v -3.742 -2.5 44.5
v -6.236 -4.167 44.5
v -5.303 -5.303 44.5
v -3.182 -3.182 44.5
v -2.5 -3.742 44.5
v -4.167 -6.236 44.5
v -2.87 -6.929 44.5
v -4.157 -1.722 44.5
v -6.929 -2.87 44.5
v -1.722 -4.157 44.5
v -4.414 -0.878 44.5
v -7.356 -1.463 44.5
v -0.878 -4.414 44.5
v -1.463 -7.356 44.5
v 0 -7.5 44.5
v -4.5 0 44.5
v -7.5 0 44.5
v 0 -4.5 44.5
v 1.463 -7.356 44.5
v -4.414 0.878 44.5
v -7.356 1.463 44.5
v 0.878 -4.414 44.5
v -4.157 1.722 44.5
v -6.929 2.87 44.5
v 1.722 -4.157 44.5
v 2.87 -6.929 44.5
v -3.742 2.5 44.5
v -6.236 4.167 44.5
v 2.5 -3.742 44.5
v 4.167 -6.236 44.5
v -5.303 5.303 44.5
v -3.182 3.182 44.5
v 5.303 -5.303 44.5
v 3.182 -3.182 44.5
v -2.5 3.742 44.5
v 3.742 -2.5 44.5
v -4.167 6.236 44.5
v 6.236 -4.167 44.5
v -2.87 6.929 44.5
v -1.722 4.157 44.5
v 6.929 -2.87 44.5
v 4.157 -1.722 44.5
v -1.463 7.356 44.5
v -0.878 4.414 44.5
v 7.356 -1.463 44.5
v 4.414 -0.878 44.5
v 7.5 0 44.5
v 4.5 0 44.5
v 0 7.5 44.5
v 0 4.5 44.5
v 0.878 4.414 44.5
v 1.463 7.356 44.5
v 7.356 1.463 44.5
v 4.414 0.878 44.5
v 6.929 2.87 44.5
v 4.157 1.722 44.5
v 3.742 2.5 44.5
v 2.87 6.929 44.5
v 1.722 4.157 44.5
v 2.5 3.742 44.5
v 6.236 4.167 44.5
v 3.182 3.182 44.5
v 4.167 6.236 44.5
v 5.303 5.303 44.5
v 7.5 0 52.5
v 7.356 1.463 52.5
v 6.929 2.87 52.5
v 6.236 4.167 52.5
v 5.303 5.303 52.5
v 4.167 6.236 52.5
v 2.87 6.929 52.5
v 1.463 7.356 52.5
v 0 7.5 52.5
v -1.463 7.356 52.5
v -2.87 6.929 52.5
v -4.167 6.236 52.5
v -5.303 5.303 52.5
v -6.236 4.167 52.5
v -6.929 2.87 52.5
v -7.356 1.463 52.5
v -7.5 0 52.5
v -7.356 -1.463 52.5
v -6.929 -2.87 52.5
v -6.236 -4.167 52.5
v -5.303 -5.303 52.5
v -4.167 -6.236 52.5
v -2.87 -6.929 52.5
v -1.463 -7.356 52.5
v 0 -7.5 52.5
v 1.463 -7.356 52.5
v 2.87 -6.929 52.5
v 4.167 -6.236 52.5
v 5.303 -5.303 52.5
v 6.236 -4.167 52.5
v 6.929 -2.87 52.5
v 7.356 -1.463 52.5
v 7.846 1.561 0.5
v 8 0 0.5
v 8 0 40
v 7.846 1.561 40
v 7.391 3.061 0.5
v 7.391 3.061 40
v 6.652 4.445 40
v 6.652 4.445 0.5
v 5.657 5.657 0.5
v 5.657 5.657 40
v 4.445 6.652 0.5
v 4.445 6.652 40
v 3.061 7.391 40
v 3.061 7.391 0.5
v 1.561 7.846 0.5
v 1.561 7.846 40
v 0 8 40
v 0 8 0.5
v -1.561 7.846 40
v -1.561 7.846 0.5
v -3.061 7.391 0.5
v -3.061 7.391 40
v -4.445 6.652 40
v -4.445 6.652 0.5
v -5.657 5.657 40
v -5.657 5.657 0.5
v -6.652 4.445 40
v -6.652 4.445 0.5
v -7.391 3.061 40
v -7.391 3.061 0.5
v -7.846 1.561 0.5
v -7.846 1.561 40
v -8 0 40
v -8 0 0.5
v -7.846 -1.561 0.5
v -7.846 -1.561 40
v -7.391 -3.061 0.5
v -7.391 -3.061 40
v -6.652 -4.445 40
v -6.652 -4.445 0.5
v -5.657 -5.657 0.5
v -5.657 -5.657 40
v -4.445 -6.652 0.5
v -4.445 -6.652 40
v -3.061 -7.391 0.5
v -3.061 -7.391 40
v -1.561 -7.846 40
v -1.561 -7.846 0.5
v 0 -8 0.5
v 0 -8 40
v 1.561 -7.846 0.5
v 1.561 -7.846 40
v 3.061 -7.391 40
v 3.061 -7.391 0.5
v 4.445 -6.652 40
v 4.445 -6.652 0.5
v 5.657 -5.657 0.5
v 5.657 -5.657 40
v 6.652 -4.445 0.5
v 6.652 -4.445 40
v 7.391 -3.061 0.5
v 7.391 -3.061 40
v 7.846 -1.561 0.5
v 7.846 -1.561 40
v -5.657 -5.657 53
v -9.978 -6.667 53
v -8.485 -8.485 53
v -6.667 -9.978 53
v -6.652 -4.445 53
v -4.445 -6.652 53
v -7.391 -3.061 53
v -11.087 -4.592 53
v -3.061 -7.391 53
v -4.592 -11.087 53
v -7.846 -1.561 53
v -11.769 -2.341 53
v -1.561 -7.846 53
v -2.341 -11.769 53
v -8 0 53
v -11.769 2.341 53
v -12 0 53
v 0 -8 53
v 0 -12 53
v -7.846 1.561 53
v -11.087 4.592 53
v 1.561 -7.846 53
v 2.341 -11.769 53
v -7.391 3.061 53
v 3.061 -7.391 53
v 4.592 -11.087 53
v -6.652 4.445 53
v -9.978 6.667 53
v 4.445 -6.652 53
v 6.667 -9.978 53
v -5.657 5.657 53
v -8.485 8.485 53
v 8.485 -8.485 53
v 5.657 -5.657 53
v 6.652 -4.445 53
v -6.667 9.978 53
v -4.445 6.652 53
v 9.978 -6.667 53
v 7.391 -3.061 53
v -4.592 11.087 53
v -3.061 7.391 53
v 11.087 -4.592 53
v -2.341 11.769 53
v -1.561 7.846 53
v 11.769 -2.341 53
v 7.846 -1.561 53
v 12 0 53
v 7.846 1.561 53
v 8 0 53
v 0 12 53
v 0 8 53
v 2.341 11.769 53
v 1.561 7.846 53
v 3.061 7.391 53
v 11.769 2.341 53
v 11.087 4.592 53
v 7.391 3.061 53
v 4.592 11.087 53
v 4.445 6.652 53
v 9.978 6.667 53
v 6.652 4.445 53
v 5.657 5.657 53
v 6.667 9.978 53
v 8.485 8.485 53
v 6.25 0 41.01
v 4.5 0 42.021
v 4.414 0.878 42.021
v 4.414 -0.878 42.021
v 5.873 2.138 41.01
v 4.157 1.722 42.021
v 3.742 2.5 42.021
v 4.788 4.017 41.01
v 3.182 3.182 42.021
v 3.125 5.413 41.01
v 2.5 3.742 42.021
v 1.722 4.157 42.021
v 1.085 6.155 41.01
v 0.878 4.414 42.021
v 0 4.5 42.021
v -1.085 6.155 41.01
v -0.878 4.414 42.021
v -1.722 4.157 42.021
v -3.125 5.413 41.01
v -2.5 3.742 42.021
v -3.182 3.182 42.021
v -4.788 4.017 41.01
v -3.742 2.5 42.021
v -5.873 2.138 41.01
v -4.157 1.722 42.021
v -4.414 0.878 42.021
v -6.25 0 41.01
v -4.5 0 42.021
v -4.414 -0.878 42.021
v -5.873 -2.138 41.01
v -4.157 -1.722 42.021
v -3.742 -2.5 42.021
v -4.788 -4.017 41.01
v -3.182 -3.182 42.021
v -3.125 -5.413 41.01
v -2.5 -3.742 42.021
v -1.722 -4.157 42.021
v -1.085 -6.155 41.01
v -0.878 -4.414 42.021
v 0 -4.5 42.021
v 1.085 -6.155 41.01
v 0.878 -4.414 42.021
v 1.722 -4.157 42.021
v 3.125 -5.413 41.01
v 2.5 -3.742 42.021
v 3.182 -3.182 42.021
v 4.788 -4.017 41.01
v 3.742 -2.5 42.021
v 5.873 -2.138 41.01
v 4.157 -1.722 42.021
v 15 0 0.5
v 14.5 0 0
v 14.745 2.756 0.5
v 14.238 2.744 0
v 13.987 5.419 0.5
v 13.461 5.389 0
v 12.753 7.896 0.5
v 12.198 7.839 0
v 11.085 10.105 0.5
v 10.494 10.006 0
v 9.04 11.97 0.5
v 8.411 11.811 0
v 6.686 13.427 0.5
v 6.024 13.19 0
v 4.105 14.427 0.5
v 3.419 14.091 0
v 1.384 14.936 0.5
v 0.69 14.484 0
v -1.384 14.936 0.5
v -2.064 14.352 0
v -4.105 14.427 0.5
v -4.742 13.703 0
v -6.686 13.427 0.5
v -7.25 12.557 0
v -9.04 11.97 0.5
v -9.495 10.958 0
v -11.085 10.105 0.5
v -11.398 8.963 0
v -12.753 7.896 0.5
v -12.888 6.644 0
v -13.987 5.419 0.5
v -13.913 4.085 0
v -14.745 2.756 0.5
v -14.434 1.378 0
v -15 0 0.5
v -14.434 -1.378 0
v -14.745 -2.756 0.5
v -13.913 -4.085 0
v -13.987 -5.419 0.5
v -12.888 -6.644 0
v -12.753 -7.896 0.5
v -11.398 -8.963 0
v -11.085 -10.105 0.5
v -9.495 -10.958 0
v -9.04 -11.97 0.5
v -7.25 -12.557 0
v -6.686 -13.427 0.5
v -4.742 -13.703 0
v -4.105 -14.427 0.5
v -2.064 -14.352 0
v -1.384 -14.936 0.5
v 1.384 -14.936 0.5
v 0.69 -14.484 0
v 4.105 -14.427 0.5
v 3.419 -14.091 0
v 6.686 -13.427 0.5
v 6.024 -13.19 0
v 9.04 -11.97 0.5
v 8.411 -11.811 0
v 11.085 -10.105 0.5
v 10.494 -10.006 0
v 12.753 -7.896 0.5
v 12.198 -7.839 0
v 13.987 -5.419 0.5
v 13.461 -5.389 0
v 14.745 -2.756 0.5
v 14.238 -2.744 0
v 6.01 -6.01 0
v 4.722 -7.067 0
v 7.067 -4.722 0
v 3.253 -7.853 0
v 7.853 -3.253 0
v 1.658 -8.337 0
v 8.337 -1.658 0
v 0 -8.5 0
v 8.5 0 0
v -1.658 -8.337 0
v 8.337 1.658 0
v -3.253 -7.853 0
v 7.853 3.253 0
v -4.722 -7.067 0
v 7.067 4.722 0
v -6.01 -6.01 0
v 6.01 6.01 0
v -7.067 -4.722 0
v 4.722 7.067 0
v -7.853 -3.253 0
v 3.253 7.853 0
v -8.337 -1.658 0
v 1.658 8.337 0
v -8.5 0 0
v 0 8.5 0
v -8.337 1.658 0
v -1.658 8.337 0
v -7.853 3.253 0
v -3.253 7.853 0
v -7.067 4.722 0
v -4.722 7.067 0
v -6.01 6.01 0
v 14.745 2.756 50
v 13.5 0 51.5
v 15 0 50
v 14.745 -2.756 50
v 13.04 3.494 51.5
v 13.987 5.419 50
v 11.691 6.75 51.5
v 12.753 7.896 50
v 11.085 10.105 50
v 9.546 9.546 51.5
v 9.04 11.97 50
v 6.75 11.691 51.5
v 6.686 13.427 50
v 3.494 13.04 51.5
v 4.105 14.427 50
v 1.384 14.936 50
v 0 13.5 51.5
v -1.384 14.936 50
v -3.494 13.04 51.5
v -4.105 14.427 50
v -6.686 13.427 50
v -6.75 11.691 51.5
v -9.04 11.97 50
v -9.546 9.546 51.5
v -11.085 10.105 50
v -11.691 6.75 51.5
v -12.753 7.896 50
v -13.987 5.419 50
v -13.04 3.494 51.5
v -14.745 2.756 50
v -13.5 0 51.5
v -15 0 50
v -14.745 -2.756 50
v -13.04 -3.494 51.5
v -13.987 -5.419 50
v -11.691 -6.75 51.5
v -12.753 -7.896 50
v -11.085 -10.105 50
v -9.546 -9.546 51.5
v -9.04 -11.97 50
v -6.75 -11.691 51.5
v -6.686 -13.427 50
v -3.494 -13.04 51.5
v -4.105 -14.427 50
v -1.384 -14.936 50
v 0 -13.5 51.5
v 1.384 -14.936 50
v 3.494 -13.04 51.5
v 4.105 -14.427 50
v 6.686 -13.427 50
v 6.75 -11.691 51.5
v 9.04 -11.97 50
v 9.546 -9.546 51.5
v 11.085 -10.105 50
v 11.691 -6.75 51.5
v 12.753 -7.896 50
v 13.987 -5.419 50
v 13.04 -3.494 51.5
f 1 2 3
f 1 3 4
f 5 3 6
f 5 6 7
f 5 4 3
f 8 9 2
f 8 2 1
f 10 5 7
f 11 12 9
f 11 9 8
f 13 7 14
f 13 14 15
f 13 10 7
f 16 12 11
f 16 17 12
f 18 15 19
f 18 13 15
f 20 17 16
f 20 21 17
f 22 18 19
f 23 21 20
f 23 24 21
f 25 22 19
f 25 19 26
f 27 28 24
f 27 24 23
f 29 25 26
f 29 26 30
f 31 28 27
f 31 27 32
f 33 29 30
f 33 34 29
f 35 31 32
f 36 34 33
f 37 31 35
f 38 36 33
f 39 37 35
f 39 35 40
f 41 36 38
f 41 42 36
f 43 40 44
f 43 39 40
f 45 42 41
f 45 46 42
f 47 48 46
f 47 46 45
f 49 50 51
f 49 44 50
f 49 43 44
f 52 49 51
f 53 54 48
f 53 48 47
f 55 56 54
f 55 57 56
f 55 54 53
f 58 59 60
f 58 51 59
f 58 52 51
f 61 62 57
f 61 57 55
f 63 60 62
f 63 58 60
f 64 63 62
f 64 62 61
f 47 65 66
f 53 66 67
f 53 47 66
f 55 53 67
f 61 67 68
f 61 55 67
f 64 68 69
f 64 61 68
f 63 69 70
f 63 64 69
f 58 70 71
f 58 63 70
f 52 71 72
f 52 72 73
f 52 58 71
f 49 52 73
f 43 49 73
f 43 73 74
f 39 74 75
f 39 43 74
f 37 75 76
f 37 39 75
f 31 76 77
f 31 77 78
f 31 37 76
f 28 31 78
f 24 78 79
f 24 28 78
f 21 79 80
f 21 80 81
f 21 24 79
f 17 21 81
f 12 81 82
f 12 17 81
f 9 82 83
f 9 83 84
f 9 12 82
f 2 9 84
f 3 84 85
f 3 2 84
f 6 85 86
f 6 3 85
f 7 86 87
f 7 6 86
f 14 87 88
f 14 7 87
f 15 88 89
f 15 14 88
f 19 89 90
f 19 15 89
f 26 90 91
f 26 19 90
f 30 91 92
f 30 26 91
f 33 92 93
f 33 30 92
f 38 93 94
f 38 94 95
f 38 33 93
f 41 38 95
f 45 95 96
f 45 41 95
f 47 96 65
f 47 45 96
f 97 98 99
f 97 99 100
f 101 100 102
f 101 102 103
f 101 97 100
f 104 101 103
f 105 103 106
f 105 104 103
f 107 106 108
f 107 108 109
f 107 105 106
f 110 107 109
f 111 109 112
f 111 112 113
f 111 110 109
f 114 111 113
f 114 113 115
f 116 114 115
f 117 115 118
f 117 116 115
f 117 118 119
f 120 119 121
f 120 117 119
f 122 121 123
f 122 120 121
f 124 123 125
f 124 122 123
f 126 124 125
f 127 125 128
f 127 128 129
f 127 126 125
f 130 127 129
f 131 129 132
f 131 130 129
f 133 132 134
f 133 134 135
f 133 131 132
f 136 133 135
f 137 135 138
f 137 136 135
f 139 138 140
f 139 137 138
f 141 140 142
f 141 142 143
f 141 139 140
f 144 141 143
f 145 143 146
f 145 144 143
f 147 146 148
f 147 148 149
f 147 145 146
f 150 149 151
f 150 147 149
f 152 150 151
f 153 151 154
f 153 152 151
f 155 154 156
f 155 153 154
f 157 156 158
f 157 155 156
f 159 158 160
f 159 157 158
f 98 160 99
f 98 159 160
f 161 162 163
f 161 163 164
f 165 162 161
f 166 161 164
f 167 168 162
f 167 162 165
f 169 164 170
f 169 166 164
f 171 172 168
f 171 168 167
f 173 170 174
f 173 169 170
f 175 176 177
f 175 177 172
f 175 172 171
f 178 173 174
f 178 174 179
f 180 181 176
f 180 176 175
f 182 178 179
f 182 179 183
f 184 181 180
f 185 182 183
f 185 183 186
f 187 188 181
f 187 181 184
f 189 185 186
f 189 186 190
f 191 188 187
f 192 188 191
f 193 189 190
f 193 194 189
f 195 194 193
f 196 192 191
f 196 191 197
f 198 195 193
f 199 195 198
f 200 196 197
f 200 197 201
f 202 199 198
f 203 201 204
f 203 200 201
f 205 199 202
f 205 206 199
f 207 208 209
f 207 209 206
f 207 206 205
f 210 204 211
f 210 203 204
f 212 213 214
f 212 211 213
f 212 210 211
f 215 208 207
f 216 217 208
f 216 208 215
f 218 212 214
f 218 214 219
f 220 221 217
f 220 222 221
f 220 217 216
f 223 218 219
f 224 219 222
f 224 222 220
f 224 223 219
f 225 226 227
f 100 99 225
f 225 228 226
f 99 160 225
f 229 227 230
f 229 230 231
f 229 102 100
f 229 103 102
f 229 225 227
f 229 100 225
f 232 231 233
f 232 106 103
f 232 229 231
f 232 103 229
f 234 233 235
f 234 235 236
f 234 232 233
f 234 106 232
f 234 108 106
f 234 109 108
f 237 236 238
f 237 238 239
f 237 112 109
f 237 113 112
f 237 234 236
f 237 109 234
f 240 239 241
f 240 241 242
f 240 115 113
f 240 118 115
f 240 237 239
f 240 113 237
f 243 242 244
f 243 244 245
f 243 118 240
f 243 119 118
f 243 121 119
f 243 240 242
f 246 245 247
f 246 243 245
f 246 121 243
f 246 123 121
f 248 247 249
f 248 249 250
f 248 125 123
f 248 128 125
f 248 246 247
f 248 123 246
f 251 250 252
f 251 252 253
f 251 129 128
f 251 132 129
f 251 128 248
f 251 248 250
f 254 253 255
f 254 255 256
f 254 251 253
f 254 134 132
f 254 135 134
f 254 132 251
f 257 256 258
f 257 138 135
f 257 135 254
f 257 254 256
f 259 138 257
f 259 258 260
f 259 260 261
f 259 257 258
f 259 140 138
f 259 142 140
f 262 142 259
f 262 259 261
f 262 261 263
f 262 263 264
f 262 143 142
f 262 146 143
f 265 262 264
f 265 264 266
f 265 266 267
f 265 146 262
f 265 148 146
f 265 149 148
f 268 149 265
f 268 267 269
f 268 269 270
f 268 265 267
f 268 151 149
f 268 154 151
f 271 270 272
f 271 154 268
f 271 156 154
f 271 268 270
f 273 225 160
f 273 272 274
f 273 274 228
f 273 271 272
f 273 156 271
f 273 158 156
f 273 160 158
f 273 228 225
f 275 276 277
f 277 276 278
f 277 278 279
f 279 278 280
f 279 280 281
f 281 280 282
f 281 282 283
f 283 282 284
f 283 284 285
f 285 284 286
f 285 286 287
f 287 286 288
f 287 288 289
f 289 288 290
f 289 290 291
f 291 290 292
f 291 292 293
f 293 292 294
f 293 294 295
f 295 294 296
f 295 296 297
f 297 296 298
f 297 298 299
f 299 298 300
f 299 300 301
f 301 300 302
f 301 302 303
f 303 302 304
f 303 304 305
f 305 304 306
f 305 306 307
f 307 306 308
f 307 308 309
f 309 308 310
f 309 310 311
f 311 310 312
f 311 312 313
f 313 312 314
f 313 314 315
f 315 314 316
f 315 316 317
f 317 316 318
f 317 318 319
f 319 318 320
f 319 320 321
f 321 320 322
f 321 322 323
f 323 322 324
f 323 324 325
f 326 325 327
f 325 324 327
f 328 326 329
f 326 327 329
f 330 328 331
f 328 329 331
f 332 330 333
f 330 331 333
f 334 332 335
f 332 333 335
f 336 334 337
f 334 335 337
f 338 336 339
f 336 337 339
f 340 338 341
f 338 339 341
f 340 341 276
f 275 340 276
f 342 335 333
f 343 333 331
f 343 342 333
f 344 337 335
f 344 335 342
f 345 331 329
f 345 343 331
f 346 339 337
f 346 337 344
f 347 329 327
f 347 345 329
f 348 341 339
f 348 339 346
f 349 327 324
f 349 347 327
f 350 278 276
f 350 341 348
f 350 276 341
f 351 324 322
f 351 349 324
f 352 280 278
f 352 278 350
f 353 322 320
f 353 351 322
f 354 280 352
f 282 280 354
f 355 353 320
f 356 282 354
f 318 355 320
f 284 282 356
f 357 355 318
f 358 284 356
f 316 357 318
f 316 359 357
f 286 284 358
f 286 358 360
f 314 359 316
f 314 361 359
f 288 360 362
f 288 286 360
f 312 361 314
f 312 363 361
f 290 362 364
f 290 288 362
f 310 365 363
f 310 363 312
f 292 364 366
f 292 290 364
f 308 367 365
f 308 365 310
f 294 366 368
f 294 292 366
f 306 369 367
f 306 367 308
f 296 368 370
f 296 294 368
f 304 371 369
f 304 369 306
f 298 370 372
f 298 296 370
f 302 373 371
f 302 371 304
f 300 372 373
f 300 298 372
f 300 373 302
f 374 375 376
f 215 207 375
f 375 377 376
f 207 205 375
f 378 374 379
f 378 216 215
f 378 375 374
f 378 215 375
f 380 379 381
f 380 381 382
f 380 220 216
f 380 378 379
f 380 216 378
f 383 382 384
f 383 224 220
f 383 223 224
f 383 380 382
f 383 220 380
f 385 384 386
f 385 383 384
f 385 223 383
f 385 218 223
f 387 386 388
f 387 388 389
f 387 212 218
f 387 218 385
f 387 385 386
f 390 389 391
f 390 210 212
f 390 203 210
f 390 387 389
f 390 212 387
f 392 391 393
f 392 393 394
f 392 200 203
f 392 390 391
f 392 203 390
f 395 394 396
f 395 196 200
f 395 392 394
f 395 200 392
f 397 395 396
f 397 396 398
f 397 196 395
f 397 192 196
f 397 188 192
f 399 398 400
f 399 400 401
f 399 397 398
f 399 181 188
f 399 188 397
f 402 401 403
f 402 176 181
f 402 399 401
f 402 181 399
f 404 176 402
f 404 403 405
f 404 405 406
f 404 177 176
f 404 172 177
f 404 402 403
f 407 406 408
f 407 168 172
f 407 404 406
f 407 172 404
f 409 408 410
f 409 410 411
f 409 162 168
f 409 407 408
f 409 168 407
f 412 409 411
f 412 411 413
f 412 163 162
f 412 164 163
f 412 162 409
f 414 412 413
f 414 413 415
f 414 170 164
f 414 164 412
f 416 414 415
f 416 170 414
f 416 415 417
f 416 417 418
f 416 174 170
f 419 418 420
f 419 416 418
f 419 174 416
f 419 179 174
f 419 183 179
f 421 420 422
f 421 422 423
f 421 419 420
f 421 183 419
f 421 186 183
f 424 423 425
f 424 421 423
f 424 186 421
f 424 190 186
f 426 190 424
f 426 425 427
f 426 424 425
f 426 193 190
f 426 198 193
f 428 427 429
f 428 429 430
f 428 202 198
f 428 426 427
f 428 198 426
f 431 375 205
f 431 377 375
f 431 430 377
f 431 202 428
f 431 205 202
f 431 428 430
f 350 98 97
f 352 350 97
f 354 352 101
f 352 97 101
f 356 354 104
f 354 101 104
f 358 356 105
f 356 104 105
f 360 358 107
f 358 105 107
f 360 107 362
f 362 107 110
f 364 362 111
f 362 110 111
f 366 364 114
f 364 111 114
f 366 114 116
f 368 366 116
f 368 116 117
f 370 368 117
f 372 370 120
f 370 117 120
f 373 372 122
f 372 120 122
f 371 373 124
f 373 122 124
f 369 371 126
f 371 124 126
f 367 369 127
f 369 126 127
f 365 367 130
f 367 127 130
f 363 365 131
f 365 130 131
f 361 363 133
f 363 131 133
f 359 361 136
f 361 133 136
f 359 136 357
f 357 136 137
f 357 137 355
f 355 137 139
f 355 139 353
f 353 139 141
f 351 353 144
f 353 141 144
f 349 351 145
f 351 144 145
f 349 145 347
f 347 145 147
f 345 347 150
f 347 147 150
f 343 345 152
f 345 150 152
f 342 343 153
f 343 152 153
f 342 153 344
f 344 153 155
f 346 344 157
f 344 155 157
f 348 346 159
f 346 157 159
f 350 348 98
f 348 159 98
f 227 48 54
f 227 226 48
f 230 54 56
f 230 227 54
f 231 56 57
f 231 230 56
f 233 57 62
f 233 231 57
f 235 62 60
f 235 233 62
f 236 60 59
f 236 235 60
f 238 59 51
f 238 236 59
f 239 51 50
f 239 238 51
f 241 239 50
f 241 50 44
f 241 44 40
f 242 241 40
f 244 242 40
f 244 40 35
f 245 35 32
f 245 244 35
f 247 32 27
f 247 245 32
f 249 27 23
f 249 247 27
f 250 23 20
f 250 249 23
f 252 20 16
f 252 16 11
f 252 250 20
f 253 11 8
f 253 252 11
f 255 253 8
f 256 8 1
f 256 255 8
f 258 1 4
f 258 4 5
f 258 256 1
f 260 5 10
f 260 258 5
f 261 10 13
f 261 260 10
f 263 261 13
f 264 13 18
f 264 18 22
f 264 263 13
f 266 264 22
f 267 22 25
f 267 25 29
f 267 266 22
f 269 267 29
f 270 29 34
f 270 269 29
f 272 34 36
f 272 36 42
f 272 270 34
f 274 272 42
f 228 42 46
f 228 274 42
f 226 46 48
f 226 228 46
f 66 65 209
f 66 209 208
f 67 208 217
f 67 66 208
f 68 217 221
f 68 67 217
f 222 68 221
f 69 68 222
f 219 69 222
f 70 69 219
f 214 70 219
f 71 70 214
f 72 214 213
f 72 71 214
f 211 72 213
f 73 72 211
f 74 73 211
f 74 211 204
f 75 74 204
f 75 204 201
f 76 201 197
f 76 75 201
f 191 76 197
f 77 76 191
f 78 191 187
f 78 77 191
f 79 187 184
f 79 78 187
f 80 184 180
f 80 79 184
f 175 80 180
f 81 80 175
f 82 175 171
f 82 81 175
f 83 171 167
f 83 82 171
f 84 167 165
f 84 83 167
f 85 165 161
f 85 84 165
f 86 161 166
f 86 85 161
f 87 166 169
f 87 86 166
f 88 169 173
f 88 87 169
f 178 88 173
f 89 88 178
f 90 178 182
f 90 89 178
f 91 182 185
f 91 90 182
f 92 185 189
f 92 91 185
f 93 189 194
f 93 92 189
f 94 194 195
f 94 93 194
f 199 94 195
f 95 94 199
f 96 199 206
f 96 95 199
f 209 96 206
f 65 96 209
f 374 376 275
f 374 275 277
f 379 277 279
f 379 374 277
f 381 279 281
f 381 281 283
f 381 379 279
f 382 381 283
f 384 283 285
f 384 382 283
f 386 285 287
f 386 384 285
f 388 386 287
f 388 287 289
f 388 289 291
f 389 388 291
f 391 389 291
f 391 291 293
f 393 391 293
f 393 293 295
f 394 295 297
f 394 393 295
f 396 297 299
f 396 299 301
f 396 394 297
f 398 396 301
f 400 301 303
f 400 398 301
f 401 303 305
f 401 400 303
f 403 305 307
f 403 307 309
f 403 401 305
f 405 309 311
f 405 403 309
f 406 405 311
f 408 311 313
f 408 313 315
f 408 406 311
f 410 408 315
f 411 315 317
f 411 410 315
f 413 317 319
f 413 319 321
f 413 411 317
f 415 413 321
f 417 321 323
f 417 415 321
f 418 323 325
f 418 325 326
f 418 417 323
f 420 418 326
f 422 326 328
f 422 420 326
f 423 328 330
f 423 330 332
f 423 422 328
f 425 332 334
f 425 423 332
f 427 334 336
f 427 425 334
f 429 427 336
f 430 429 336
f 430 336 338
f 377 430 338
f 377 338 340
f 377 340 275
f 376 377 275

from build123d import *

# Parameters (mm, degrees)
F2_SIZE = 3
F3_SIZE = 0.5


with BuildPart() as f1:
    # F0 (on Front) → F1 (revolve)
    with BuildSketch(Plane.XZ):
        Polygon((8, 40), (8, 0), (15, 0), (15, 53), (7.5, 53), (7.5, 44.5), (4.5, 44.5), (4.5, 42.020726), align=None)
    revolve(axis=Axis((0, 0, 33.144991), (0, 0, 1)))

    # F2
    f2_edges = [f1.edges().sort_by_distance(p)[0] for p in [
        (-15, 0, 53),
    ]]
    chamfer(f2_edges, length=F2_SIZE)

    # F3
    f3_edges = [f1.edges().sort_by_distance(p)[0] for p in [
        (-7.5, 0, 53),
        (-15, 0, 0),
        (-8, 0, 0),
    ]]
    chamfer(f3_edges, length=F3_SIZE)


solid = f1.part
